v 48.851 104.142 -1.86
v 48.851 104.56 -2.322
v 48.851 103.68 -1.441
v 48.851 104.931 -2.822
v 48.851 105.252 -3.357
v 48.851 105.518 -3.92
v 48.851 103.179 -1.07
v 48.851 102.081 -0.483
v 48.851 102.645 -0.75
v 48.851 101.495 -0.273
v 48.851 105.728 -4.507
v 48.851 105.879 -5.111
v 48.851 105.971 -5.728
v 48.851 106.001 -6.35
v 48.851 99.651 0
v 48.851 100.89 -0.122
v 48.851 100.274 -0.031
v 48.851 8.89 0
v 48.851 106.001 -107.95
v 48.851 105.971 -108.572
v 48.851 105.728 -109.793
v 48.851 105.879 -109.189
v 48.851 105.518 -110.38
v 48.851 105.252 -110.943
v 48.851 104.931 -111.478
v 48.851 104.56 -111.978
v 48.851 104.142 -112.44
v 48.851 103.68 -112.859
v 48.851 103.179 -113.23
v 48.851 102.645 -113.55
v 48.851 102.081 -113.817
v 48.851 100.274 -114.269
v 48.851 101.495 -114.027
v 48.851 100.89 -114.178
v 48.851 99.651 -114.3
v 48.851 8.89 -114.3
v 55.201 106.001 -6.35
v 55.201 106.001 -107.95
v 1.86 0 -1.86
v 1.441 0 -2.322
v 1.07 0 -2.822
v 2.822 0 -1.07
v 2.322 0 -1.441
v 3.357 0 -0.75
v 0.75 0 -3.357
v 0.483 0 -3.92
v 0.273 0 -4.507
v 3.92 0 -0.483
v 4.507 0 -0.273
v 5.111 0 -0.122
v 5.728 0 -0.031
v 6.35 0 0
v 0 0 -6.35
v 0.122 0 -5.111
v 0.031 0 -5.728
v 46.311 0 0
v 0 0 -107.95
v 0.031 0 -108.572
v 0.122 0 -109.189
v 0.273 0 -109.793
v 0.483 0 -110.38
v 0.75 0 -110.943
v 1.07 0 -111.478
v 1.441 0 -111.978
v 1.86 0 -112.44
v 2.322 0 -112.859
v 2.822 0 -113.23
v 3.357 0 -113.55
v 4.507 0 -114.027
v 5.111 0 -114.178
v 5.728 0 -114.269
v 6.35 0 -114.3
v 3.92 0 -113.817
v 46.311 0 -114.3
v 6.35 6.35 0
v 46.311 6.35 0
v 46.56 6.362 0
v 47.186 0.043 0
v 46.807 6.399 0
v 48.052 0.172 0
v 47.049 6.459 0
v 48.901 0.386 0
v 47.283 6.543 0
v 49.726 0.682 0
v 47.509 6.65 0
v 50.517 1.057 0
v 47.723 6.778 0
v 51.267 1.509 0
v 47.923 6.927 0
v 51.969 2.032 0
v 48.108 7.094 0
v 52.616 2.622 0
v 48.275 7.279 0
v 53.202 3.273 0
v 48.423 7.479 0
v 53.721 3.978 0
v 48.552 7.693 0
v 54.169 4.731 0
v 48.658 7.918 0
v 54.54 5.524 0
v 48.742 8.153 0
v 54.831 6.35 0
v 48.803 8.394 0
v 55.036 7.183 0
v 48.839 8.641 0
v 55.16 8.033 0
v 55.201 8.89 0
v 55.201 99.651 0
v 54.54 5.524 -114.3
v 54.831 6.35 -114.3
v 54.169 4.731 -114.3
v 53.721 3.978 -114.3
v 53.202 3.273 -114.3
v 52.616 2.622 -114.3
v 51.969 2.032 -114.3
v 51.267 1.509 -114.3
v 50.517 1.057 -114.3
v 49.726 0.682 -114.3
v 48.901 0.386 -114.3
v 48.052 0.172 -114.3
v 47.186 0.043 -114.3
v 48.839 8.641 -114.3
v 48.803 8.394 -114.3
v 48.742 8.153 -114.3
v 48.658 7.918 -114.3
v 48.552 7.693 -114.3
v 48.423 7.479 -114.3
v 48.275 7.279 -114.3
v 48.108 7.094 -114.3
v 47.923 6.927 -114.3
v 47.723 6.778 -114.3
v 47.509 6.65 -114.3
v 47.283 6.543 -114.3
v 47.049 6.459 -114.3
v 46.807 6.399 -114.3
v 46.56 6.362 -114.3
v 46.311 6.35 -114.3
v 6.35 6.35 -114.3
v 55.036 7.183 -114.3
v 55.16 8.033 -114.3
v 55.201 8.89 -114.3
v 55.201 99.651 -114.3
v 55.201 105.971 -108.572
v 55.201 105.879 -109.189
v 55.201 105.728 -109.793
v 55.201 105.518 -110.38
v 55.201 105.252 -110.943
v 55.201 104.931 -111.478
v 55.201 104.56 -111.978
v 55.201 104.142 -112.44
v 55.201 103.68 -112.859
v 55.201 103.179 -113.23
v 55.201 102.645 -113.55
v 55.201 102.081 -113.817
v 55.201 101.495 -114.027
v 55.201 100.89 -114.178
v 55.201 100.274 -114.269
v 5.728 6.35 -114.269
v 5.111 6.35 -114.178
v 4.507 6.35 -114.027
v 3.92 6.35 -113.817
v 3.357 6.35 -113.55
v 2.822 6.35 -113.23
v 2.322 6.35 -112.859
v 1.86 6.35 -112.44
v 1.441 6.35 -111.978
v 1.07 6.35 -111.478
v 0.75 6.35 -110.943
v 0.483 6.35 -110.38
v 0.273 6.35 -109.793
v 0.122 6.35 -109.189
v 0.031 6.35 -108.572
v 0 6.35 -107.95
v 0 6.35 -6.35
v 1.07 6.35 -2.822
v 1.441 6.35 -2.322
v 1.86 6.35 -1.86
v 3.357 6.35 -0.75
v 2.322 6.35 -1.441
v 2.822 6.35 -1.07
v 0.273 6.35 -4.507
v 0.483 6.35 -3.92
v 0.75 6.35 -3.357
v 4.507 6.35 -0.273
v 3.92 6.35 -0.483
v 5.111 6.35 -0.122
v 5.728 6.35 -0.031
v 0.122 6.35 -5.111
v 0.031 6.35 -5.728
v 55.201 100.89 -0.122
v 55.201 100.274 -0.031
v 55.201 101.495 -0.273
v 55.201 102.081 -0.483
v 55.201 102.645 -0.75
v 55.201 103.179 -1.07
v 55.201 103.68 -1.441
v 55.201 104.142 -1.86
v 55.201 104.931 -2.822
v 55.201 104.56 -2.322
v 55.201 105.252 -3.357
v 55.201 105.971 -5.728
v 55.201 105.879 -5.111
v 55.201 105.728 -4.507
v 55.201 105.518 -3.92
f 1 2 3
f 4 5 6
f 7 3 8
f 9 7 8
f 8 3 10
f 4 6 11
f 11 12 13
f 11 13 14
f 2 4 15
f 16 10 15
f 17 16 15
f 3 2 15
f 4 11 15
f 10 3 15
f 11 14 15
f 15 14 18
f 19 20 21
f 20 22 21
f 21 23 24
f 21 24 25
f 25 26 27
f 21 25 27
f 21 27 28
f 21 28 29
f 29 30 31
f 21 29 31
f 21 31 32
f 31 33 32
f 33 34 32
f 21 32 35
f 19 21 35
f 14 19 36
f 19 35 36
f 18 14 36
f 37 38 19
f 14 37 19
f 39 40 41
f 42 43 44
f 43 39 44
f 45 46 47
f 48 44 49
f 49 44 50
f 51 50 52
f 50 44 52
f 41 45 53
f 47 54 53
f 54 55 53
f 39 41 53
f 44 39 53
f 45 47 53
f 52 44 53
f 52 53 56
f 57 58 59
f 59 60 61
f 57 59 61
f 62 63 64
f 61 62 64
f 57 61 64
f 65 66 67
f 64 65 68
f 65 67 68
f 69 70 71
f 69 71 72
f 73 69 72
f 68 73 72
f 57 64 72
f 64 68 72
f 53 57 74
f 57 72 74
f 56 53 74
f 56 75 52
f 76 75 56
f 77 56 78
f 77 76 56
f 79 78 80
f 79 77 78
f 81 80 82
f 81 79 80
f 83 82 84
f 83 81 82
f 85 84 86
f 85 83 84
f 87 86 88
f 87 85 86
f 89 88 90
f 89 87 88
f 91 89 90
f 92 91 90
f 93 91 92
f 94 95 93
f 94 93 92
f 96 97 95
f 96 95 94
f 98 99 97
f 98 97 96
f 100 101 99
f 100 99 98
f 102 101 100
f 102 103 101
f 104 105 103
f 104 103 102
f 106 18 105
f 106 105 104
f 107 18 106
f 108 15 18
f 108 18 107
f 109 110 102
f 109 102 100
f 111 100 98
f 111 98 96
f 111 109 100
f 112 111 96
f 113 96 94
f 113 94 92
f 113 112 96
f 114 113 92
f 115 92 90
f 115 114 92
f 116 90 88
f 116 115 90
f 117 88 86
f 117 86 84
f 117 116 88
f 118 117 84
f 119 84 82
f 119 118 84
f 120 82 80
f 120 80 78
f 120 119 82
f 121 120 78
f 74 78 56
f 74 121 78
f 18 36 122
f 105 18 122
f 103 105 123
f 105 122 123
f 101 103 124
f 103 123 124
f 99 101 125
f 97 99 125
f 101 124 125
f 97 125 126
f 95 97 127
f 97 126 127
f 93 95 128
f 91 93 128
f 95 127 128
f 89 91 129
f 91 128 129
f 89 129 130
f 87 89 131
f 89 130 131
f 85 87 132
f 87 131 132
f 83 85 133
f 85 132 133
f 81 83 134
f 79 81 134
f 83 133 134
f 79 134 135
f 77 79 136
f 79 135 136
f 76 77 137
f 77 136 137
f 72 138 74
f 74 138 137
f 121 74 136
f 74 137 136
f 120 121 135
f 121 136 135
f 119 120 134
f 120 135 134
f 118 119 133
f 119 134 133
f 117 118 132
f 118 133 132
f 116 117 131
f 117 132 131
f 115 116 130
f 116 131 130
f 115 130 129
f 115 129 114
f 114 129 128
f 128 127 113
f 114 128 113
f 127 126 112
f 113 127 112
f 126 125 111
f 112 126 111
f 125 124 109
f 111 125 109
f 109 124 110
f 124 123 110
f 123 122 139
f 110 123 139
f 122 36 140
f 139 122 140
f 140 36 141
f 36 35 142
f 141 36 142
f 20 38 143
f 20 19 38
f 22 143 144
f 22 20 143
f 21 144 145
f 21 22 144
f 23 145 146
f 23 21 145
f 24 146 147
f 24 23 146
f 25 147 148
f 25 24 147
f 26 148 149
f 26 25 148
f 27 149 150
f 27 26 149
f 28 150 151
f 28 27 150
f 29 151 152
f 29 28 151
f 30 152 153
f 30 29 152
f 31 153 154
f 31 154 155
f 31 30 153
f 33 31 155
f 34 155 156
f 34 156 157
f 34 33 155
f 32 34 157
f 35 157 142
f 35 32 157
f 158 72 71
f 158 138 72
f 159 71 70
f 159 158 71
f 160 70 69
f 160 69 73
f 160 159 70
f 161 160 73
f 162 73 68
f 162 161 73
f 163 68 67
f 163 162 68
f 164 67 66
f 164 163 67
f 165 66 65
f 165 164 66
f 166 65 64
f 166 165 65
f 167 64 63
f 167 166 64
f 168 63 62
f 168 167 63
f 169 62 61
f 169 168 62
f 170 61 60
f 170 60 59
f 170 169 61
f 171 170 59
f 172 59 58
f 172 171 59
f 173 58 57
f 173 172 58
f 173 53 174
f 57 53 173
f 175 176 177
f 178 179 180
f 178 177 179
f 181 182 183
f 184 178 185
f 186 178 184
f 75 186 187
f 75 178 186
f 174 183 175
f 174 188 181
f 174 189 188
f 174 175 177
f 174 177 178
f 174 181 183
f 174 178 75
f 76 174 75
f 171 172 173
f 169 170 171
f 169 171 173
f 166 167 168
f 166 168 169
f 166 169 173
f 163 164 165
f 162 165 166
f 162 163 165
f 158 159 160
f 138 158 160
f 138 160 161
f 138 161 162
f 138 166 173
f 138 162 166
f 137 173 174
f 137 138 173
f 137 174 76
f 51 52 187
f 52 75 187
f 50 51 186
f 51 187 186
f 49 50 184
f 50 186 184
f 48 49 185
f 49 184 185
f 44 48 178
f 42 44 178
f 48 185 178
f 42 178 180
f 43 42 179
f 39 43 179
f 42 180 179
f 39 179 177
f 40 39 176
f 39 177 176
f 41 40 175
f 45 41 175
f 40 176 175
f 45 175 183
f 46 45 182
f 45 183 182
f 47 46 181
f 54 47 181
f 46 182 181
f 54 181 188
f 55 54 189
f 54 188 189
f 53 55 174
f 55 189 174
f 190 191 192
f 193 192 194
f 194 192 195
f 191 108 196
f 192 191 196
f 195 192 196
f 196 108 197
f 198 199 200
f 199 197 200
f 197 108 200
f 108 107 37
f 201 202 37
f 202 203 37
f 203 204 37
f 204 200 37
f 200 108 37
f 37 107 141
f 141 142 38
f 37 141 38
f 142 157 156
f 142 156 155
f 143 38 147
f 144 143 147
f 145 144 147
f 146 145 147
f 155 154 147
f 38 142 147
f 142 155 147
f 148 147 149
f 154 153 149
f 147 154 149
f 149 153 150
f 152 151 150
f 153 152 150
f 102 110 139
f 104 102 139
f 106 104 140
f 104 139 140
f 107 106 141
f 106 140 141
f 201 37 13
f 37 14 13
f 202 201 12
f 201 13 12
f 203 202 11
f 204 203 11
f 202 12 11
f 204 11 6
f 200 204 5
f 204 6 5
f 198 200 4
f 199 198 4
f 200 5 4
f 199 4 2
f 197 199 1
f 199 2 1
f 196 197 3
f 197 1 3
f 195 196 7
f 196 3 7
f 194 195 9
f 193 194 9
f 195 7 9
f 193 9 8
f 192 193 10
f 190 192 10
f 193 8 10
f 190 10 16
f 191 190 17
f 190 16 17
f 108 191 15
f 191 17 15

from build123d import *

# Parameters (mm, degrees)
SKETCH11_W             = 152.4
SKETCH11_H             = 114.3
BOSS_EXTRUDE1_DEPTH    = 6.35
SKETCHED_START         = -114.3
SKETCHED_BEND1_DEPTH   = 114.3
SKETCHED_BEND1_2_DEPTH = 114.3
FILLET1_R              = 6.35


# Read off the part's stored shape, not the designer's step: Sketched Bend1
with BuildPart() as part:
    # Sketch11 → Boss-Extrude1 (new body)
    with BuildSketch(Plane(origin=(0, 0, 0), x_dir=(1, 0, 0), z_dir=(0, 1, 0))):
        with Locations((76.2, 57.15)):
            Rectangle(SKETCH11_W, SKETCH11_H)
    extrude(amount=BOSS_EXTRUDE1_DEPTH)

    # Sketched Bend1 outline → Sketched Bend1 (cut)
    with BuildSketch(Plane.XY.offset(SKETCHED_START)):
        with BuildLine():
            Line((152.4, 6.35), (54.83086849, 6.35))
            ThreePointArc((54.83086849, 6.35), (51.624240665, 1.762142678), (46.311449496, 0))
            Line((46.311449496, 0), (152.4, 0))
            Line((152.4, 0), (152.4, 6.35))
        make_face()
    extrude(amount=SKETCHED_BEND1_DEPTH, mode=Mode.SUBTRACT)

    # Sketched Bend1 2 outline → Sketched Bend1 2 (add)
    with BuildSketch(Plane.XY.offset(SKETCHED_START)):
        with BuildLine():
            Line((48.851449496, 106.001449496), (48.851449496, 8.89))
            ThreePointArc((48.851449496, 8.89), (48.10750072, 7.093948776), (46.311449496, 6.35))
            Line((46.311449496, 6.35), (54.83086849, 6.35))
            ThreePointArc((54.83086849, 6.35), (55.108316406, 7.606554415), (55.201449496, 8.89))
            Line((55.201449496, 8.89), (55.201449496, 106.001449496))
            Line((55.201449496, 106.001449496), (48.851449496, 106.001449496))
        make_face()
    extrude(amount=SKETCHED_BEND1_2_DEPTH)

    # Fillet1
    fillet1_edges = [part.edges().sort_by_distance(p)[0] for p in [
        (0, 3.175, 0),
        (0, 3.175, -114.3),
        (52.026449496, 106.001449496, -114.3),
        (52.026449496, 106.001449496, 0),
    ]]
    fillet(fillet1_edges, radius=FILLET1_R)


solid = part.part
